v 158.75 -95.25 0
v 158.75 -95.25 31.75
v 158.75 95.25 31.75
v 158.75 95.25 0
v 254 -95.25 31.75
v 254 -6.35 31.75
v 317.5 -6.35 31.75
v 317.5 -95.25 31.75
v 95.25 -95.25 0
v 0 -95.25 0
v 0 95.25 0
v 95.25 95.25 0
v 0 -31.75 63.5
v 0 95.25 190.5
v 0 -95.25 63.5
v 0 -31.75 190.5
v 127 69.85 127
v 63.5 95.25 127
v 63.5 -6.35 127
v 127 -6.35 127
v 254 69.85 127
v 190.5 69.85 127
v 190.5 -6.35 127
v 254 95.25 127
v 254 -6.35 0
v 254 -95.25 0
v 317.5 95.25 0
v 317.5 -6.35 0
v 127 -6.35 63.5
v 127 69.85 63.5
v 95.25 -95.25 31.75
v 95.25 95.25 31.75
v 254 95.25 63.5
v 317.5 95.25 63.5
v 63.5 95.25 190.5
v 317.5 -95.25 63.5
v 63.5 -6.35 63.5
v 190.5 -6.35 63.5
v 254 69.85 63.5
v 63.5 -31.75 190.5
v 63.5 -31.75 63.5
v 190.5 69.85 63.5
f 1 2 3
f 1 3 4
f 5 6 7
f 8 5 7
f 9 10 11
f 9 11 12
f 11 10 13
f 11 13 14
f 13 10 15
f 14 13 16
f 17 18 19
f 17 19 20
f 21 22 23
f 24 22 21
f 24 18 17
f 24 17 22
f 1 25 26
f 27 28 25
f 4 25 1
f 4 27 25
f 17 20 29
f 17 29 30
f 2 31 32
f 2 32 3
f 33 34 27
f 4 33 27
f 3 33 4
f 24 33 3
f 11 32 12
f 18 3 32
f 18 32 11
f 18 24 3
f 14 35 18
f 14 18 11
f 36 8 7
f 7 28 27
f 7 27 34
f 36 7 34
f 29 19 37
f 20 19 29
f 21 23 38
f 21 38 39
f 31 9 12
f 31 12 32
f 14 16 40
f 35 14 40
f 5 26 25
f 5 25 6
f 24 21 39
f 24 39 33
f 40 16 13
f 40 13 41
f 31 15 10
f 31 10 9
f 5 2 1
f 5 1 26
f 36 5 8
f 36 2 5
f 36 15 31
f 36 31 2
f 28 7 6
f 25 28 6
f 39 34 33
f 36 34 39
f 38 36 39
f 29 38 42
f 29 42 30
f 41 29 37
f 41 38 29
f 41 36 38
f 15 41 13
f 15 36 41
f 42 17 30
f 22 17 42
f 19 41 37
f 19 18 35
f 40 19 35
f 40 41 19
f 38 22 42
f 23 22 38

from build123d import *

# Parameters (mm, degrees)
F1_DEPTH = 95.25
F2_W     = 63.5
F2_H     = 31.75
F3_DEPTH = 101.6
F5_START = -63.5
F4_W     = 63.5
F4_H     = 127
F5_DEPTH = 127
F7_START = -63.5
F7_DEPTH = 76.2


with BuildPart() as f1:
    # F0 (on Front) → F1 (new body, symmetric)
    with BuildSketch(Plane.XZ):
        Polygon((0, 63.5), (0, 0), (95.25, 0), (95.25, 31.75), (158.75, 31.75), (158.75, 0), (254, 0), (254, 31.75), (317.5, 31.75), (317.5, 63.5), align=None)
    extrude(amount=F1_DEPTH, both=True)

    # F2 (on face) → F3 (join)
    with BuildSketch(Plane(origin=(0, 95.25, 0), x_dir=(-1, 0, 0), z_dir=(0, 1, 0))):
        with Locations((-285.75, 15.875)):
            Rectangle(F2_W, F2_H)
    extrude(amount=-F3_DEPTH)

    # F4 (on face) → F5 (join)
    with BuildSketch(Plane.XZ.offset(95.25).offset(F5_START)):
        with Locations((31.75, 127)):
            Rectangle(F4_W, F4_H)
    extrude(amount=-F5_DEPTH)

    # F6 (on face) → F7 (join)
    with BuildSketch(Plane.XY.offset(190.5).offset(F7_START)):
        Polygon((254, 95.25), (63.5, 95.25), (63.5, -6.35), (127, -6.35), (127, 69.85), (190.5, 69.85), (190.5, -6.35), (254, 69.85), align=None)
    extrude(amount=-F7_DEPTH)


solid = f1.part
